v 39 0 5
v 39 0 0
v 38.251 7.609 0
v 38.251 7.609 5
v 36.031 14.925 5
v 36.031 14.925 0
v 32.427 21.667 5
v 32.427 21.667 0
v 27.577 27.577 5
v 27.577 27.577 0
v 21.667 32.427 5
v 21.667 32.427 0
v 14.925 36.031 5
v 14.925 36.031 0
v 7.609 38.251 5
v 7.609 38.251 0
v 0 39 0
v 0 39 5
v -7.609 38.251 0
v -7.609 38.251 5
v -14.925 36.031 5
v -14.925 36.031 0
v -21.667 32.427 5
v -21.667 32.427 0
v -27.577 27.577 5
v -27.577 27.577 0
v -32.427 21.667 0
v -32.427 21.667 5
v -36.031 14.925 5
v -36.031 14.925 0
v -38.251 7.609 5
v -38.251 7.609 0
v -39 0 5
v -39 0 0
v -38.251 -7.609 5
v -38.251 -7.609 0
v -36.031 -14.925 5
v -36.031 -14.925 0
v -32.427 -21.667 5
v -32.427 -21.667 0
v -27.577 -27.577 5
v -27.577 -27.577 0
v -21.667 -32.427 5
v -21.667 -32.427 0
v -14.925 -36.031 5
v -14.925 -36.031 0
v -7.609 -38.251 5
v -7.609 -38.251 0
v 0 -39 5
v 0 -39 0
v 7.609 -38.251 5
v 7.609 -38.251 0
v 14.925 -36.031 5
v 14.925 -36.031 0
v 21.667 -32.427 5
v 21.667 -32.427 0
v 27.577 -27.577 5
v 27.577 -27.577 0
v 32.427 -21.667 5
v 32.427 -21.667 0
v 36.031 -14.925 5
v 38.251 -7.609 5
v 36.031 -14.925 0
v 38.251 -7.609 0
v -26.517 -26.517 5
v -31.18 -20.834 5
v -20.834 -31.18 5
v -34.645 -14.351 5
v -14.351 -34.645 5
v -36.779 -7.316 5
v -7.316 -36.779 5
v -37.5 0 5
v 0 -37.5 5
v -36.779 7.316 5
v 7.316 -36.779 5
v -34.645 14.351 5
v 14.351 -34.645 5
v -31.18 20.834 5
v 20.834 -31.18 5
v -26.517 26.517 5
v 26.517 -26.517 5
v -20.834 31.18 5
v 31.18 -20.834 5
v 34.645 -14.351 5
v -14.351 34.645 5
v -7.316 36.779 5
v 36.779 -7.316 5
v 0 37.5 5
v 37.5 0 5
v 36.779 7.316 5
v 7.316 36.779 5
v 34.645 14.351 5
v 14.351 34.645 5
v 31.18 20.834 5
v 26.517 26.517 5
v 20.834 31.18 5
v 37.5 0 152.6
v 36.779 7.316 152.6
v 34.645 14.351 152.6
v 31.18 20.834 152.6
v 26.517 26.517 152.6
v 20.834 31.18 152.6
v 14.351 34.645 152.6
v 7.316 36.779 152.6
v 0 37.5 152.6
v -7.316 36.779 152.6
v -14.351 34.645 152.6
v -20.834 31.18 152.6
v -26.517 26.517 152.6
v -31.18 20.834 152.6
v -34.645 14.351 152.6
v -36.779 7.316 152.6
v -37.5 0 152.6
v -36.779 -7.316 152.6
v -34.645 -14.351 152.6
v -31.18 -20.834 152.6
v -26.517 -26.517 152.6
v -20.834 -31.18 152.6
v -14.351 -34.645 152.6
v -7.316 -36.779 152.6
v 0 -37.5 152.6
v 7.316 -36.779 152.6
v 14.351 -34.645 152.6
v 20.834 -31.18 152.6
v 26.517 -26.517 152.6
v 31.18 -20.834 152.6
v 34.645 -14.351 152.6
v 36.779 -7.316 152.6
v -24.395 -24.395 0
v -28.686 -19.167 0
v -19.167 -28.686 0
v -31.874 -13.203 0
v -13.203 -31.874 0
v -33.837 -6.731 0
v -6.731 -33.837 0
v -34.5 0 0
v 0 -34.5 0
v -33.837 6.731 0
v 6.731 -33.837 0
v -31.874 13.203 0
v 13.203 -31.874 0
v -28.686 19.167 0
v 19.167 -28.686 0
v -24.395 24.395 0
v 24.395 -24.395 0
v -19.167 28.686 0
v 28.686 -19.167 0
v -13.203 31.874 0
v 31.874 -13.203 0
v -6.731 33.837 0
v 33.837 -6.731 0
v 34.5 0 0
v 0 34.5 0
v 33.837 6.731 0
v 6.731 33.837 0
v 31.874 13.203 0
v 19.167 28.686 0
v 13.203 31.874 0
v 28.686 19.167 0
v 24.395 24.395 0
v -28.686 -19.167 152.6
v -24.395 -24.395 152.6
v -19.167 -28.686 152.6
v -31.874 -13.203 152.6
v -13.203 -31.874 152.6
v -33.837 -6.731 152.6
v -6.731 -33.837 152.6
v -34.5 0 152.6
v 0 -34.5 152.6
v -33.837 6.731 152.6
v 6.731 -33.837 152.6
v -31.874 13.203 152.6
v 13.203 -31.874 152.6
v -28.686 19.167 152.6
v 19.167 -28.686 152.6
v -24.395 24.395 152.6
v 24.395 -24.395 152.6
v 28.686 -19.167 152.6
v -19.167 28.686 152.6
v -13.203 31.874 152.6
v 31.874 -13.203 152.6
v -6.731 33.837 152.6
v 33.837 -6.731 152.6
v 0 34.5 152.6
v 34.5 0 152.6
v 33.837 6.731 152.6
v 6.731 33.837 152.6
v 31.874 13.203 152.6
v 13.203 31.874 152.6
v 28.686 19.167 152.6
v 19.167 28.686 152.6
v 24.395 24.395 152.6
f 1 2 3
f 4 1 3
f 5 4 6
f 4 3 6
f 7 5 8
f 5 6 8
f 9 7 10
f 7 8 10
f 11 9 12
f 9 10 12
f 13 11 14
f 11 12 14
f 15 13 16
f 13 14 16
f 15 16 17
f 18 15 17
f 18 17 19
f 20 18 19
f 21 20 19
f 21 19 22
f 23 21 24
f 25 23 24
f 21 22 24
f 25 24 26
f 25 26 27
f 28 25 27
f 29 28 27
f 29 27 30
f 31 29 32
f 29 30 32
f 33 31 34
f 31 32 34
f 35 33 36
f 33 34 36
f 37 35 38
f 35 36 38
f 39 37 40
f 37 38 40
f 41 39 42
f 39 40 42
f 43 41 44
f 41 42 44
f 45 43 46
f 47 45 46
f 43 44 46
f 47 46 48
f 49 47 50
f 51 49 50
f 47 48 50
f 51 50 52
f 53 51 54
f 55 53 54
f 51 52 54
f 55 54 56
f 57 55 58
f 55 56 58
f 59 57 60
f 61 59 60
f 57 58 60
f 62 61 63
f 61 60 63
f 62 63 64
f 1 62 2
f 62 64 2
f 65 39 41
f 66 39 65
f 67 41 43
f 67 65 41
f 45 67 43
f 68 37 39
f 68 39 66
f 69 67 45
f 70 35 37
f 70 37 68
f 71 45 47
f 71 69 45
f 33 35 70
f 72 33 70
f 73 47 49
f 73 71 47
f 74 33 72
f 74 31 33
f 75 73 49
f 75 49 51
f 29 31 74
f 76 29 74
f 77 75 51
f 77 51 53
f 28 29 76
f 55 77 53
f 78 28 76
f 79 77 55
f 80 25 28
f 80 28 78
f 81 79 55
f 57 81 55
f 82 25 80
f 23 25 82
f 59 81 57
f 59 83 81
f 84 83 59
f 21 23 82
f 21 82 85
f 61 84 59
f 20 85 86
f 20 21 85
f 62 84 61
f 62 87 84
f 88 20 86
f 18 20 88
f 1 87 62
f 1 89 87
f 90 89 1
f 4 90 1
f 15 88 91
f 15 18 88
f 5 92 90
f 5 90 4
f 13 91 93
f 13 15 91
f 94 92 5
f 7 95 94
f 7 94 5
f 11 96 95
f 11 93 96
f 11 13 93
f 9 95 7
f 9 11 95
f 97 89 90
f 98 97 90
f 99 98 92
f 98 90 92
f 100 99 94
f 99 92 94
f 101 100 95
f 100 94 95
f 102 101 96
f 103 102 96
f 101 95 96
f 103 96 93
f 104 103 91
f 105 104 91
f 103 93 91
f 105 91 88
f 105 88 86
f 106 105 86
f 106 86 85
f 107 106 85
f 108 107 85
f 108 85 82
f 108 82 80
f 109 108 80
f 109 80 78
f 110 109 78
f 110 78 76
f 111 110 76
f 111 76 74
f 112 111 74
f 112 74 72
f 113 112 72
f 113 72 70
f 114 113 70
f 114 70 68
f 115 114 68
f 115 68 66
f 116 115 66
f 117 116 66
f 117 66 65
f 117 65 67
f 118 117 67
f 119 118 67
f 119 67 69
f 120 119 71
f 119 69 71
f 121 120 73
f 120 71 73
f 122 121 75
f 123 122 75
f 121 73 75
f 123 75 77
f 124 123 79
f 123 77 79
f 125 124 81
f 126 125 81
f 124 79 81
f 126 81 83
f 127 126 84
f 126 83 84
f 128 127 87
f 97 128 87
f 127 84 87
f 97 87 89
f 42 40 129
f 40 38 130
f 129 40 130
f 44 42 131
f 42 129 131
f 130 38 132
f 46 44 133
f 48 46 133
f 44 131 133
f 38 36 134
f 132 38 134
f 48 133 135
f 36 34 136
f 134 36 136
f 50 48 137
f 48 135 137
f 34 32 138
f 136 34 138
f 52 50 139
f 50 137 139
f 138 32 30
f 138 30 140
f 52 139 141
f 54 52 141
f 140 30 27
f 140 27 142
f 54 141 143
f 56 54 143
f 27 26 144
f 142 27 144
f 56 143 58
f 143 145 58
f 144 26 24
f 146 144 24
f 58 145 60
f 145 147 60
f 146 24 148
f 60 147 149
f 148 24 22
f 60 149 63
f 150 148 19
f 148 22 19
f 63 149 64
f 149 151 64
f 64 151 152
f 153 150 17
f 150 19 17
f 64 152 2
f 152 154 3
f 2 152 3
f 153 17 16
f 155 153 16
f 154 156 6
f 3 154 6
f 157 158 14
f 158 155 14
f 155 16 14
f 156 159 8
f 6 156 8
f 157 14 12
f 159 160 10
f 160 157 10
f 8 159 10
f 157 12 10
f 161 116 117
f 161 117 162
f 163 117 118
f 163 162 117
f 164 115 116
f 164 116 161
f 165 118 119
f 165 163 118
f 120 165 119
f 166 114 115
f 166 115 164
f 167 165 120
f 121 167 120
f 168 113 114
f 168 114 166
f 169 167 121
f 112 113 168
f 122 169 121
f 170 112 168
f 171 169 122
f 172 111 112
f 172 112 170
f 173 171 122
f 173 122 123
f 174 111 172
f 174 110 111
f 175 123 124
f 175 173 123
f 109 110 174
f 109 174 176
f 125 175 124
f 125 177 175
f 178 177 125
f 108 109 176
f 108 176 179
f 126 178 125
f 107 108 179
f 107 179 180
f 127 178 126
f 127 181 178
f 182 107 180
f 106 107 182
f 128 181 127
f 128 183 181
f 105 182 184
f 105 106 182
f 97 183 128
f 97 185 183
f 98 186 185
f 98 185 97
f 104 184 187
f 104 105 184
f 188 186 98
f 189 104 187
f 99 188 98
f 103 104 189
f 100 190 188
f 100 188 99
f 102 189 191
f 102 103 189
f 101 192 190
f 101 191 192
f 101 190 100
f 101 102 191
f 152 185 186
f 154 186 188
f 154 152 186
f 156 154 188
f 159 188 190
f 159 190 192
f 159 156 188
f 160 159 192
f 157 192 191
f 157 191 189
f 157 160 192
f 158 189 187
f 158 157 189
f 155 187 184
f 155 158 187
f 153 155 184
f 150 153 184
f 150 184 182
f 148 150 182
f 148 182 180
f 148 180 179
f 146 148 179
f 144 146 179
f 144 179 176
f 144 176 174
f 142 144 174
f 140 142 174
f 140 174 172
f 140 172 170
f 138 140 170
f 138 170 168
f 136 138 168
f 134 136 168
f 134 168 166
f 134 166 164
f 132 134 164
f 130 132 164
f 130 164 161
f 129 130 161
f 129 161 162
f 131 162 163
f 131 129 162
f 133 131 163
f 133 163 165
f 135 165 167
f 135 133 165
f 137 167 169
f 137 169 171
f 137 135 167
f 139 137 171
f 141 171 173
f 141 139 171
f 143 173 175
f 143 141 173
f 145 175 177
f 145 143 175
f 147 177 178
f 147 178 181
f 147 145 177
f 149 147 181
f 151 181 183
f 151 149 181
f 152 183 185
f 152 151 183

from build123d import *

# Parameters (mm, degrees)
F0_R     = 37.5
F1_DEPTH = 152.6
F2_T     = -3
F4_R     = 39
F4_R_2   = 37.5
F5_DEPTH = 5


with BuildPart() as f1:
    # F0 (on Top) → F1 (new body)
    with BuildSketch(Plane.XY):
        Circle(F0_R)
    extrude(amount=F1_DEPTH)

    # F2
    f2_openings = [f1.faces().sort_by_distance(p)[0] for p in [
        (0, 0, 152.6),
        (0, 0, 0),
    ]]
    offset(amount=F2_T, openings=f2_openings)

    # F4 (on Top) → F5 (join)
    with BuildSketch(Plane.XY):
        Circle(F4_R)
        Circle(F4_R_2, mode=Mode.SUBTRACT)
    extrude(amount=F5_DEPTH)


solid = f1.part
